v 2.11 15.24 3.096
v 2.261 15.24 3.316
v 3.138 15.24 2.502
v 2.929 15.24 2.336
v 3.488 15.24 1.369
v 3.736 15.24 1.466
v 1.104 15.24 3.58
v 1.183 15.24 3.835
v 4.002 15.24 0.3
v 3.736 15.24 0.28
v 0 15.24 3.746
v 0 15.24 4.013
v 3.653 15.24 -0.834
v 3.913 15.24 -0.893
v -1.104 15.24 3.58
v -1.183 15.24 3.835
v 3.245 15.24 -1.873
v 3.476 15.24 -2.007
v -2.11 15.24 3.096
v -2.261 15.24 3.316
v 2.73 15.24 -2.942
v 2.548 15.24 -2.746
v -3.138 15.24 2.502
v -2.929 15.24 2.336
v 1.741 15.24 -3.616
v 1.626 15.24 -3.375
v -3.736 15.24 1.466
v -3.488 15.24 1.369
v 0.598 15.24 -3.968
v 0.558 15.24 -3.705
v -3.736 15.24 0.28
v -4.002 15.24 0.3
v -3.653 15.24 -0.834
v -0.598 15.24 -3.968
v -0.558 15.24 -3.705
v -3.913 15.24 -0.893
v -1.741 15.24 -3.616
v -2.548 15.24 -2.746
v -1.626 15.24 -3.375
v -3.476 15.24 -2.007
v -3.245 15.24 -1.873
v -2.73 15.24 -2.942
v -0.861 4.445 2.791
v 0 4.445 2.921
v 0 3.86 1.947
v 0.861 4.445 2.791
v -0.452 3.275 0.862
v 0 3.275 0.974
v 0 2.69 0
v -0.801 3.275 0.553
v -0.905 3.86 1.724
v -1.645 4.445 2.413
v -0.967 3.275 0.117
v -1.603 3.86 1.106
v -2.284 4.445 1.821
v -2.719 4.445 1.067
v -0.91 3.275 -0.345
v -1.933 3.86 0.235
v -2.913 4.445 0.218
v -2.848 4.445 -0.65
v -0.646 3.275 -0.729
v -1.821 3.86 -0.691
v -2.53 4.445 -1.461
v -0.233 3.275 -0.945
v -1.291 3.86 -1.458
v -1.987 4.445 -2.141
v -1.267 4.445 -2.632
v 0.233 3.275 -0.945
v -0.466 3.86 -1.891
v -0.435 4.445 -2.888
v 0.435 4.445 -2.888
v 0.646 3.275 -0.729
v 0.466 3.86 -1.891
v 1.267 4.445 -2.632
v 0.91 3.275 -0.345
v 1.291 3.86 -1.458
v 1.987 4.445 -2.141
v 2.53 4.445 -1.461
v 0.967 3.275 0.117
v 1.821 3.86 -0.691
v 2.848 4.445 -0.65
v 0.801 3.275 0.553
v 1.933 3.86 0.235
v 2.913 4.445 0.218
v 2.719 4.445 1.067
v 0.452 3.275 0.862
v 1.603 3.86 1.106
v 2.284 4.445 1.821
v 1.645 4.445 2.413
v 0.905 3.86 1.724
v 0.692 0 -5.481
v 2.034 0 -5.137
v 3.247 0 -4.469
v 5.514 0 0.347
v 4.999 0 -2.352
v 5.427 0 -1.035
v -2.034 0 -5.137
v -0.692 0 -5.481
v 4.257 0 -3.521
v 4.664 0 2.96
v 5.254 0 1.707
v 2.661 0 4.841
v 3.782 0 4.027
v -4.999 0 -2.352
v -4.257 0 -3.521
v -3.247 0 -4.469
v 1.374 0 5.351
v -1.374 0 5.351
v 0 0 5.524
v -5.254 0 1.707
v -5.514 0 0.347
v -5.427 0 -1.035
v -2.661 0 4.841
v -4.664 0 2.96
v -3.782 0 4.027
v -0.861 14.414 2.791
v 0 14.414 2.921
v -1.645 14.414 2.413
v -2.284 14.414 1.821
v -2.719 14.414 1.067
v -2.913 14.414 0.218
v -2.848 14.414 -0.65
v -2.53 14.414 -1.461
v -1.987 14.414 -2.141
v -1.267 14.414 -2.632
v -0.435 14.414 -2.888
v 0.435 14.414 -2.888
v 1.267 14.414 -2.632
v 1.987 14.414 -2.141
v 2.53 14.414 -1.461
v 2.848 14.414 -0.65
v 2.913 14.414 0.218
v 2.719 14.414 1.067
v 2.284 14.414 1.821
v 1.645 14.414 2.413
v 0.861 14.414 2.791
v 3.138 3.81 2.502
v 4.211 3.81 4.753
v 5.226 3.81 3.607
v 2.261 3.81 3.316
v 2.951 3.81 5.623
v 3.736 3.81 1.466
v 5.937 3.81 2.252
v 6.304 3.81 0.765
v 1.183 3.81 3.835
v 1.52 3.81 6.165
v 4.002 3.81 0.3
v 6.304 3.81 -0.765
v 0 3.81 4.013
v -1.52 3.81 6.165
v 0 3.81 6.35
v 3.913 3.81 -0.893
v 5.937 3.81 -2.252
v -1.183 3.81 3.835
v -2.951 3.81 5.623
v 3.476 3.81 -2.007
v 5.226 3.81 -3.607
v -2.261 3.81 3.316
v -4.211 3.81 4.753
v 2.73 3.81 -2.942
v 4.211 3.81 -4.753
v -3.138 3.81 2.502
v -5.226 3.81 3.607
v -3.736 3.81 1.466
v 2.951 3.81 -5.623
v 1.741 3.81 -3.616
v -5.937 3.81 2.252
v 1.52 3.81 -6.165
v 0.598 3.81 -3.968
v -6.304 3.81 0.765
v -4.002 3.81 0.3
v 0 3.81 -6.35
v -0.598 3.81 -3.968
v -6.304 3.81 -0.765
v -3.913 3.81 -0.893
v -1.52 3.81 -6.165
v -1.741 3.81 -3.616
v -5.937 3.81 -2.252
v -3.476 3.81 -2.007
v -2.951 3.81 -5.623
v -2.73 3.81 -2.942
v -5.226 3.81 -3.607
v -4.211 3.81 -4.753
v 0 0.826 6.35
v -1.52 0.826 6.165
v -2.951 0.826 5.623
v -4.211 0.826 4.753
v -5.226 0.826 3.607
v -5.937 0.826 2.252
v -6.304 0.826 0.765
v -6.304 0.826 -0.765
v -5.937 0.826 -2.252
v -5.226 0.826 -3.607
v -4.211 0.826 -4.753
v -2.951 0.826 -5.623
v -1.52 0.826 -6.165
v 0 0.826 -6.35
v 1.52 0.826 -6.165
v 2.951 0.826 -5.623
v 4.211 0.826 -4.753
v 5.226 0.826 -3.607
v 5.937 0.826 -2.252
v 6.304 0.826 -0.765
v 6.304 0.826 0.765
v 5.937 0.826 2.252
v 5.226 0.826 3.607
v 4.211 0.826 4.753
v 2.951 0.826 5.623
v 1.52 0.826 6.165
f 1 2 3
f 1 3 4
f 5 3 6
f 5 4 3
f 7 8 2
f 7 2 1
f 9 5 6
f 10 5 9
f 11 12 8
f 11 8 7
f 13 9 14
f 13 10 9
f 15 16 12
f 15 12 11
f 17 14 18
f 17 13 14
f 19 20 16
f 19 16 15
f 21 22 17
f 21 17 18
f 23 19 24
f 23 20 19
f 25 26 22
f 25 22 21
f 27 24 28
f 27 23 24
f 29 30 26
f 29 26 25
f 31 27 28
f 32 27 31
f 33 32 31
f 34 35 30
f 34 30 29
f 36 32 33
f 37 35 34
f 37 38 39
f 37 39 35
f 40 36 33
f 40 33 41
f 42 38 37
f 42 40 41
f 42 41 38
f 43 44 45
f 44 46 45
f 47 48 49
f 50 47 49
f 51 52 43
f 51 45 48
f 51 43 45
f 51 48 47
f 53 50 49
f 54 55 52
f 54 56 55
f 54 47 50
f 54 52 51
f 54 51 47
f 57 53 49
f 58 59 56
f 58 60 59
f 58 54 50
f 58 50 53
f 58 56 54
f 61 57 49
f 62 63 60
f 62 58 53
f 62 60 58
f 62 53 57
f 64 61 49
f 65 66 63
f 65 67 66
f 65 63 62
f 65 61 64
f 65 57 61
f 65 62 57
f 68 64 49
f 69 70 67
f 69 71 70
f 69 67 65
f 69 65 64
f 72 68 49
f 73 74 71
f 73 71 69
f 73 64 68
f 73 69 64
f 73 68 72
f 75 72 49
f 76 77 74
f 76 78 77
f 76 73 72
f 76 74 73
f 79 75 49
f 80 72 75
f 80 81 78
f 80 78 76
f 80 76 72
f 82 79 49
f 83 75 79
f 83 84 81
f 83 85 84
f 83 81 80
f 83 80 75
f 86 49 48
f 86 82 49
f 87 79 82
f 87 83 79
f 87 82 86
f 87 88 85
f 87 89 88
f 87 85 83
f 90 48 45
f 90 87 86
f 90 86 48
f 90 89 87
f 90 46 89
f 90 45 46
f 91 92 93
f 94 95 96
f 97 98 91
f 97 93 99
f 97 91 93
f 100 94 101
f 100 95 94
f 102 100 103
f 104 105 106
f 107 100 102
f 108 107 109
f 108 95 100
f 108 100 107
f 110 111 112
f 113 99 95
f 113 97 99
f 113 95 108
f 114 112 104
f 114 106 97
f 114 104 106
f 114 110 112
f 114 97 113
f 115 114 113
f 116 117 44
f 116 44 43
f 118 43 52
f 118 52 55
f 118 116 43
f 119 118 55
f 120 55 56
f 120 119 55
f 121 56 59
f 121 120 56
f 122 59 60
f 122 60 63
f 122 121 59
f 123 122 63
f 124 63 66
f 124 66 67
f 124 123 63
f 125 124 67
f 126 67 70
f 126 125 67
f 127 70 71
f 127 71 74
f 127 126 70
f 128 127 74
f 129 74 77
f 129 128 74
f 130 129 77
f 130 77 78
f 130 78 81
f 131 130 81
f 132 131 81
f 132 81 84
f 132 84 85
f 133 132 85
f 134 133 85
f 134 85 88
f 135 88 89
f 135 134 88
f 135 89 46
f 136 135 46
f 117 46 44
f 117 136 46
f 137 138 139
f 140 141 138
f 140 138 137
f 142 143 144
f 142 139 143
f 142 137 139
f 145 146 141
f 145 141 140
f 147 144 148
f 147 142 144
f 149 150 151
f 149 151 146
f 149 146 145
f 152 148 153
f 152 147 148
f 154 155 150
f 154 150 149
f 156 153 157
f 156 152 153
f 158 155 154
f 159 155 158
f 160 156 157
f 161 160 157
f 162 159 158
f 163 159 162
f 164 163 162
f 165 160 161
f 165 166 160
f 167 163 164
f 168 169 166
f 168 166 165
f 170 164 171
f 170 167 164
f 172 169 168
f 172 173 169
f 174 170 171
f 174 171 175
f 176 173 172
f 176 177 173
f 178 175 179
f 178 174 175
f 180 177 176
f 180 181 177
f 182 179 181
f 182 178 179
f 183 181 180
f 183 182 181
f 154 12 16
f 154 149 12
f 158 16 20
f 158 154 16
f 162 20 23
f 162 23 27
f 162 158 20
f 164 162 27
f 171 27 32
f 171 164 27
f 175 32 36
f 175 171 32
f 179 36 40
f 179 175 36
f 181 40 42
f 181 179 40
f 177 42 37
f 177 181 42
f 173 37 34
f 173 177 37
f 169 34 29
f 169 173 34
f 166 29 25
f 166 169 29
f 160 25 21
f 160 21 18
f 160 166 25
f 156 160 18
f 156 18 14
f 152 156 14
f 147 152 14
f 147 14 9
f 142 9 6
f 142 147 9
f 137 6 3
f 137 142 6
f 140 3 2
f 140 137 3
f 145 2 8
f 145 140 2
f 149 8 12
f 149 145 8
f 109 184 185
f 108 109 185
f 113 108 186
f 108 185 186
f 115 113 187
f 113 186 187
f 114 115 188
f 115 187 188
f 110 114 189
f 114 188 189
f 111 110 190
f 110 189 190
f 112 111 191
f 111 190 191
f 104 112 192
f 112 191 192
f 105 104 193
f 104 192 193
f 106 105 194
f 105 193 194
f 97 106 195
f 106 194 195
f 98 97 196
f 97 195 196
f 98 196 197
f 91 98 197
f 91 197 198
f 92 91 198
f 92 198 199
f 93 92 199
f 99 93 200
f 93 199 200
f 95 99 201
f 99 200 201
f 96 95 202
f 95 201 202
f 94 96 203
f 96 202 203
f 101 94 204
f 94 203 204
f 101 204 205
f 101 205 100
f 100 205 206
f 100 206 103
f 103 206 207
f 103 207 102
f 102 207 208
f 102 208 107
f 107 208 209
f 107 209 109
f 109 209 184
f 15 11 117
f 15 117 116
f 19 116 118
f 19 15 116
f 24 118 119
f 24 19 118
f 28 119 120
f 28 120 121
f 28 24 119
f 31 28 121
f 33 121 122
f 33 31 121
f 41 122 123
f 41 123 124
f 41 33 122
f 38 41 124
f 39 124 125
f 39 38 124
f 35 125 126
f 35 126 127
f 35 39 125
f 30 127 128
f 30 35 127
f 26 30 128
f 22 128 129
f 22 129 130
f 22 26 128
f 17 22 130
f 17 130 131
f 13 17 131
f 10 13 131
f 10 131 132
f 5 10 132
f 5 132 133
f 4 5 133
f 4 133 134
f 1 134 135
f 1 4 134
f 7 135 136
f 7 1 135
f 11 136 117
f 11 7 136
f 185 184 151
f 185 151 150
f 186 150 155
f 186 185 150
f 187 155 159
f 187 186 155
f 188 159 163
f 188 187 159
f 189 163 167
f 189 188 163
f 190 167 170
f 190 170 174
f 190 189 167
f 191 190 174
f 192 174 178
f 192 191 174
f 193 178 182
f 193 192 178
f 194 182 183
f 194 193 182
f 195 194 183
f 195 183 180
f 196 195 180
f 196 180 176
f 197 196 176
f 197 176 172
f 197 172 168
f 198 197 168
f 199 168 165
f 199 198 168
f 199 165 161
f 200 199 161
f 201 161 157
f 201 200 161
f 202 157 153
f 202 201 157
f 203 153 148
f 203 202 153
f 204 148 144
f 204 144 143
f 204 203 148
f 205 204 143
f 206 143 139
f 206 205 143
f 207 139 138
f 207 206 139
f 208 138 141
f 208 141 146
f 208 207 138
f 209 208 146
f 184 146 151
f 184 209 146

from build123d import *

# Parameters (mm, degrees)
F2_SIZE = 0.8255


with BuildPart() as f1:
    # F0 (on Right) → F1 (revolve)
    with BuildSketch(Plane.YZ):
        Polygon((0, 6.35), (0, 0), (2.689886, 0), (4.445, 2.921), (15.24, 2.921), (15.24, 4.0132), (3.81, 4.0132), (3.81, 6.35), align=None)
    revolve(axis=Axis((0, 1.344943, 0), (0, -1, 0)))

    # F2
    f2_edges = [f1.edges().sort_by_distance(p)[0] for p in [
        (0, 15.24, -2.921),
        (0, 0, -6.35),
    ]]
    chamfer(f2_edges, length=F2_SIZE)


solid = f1.part
